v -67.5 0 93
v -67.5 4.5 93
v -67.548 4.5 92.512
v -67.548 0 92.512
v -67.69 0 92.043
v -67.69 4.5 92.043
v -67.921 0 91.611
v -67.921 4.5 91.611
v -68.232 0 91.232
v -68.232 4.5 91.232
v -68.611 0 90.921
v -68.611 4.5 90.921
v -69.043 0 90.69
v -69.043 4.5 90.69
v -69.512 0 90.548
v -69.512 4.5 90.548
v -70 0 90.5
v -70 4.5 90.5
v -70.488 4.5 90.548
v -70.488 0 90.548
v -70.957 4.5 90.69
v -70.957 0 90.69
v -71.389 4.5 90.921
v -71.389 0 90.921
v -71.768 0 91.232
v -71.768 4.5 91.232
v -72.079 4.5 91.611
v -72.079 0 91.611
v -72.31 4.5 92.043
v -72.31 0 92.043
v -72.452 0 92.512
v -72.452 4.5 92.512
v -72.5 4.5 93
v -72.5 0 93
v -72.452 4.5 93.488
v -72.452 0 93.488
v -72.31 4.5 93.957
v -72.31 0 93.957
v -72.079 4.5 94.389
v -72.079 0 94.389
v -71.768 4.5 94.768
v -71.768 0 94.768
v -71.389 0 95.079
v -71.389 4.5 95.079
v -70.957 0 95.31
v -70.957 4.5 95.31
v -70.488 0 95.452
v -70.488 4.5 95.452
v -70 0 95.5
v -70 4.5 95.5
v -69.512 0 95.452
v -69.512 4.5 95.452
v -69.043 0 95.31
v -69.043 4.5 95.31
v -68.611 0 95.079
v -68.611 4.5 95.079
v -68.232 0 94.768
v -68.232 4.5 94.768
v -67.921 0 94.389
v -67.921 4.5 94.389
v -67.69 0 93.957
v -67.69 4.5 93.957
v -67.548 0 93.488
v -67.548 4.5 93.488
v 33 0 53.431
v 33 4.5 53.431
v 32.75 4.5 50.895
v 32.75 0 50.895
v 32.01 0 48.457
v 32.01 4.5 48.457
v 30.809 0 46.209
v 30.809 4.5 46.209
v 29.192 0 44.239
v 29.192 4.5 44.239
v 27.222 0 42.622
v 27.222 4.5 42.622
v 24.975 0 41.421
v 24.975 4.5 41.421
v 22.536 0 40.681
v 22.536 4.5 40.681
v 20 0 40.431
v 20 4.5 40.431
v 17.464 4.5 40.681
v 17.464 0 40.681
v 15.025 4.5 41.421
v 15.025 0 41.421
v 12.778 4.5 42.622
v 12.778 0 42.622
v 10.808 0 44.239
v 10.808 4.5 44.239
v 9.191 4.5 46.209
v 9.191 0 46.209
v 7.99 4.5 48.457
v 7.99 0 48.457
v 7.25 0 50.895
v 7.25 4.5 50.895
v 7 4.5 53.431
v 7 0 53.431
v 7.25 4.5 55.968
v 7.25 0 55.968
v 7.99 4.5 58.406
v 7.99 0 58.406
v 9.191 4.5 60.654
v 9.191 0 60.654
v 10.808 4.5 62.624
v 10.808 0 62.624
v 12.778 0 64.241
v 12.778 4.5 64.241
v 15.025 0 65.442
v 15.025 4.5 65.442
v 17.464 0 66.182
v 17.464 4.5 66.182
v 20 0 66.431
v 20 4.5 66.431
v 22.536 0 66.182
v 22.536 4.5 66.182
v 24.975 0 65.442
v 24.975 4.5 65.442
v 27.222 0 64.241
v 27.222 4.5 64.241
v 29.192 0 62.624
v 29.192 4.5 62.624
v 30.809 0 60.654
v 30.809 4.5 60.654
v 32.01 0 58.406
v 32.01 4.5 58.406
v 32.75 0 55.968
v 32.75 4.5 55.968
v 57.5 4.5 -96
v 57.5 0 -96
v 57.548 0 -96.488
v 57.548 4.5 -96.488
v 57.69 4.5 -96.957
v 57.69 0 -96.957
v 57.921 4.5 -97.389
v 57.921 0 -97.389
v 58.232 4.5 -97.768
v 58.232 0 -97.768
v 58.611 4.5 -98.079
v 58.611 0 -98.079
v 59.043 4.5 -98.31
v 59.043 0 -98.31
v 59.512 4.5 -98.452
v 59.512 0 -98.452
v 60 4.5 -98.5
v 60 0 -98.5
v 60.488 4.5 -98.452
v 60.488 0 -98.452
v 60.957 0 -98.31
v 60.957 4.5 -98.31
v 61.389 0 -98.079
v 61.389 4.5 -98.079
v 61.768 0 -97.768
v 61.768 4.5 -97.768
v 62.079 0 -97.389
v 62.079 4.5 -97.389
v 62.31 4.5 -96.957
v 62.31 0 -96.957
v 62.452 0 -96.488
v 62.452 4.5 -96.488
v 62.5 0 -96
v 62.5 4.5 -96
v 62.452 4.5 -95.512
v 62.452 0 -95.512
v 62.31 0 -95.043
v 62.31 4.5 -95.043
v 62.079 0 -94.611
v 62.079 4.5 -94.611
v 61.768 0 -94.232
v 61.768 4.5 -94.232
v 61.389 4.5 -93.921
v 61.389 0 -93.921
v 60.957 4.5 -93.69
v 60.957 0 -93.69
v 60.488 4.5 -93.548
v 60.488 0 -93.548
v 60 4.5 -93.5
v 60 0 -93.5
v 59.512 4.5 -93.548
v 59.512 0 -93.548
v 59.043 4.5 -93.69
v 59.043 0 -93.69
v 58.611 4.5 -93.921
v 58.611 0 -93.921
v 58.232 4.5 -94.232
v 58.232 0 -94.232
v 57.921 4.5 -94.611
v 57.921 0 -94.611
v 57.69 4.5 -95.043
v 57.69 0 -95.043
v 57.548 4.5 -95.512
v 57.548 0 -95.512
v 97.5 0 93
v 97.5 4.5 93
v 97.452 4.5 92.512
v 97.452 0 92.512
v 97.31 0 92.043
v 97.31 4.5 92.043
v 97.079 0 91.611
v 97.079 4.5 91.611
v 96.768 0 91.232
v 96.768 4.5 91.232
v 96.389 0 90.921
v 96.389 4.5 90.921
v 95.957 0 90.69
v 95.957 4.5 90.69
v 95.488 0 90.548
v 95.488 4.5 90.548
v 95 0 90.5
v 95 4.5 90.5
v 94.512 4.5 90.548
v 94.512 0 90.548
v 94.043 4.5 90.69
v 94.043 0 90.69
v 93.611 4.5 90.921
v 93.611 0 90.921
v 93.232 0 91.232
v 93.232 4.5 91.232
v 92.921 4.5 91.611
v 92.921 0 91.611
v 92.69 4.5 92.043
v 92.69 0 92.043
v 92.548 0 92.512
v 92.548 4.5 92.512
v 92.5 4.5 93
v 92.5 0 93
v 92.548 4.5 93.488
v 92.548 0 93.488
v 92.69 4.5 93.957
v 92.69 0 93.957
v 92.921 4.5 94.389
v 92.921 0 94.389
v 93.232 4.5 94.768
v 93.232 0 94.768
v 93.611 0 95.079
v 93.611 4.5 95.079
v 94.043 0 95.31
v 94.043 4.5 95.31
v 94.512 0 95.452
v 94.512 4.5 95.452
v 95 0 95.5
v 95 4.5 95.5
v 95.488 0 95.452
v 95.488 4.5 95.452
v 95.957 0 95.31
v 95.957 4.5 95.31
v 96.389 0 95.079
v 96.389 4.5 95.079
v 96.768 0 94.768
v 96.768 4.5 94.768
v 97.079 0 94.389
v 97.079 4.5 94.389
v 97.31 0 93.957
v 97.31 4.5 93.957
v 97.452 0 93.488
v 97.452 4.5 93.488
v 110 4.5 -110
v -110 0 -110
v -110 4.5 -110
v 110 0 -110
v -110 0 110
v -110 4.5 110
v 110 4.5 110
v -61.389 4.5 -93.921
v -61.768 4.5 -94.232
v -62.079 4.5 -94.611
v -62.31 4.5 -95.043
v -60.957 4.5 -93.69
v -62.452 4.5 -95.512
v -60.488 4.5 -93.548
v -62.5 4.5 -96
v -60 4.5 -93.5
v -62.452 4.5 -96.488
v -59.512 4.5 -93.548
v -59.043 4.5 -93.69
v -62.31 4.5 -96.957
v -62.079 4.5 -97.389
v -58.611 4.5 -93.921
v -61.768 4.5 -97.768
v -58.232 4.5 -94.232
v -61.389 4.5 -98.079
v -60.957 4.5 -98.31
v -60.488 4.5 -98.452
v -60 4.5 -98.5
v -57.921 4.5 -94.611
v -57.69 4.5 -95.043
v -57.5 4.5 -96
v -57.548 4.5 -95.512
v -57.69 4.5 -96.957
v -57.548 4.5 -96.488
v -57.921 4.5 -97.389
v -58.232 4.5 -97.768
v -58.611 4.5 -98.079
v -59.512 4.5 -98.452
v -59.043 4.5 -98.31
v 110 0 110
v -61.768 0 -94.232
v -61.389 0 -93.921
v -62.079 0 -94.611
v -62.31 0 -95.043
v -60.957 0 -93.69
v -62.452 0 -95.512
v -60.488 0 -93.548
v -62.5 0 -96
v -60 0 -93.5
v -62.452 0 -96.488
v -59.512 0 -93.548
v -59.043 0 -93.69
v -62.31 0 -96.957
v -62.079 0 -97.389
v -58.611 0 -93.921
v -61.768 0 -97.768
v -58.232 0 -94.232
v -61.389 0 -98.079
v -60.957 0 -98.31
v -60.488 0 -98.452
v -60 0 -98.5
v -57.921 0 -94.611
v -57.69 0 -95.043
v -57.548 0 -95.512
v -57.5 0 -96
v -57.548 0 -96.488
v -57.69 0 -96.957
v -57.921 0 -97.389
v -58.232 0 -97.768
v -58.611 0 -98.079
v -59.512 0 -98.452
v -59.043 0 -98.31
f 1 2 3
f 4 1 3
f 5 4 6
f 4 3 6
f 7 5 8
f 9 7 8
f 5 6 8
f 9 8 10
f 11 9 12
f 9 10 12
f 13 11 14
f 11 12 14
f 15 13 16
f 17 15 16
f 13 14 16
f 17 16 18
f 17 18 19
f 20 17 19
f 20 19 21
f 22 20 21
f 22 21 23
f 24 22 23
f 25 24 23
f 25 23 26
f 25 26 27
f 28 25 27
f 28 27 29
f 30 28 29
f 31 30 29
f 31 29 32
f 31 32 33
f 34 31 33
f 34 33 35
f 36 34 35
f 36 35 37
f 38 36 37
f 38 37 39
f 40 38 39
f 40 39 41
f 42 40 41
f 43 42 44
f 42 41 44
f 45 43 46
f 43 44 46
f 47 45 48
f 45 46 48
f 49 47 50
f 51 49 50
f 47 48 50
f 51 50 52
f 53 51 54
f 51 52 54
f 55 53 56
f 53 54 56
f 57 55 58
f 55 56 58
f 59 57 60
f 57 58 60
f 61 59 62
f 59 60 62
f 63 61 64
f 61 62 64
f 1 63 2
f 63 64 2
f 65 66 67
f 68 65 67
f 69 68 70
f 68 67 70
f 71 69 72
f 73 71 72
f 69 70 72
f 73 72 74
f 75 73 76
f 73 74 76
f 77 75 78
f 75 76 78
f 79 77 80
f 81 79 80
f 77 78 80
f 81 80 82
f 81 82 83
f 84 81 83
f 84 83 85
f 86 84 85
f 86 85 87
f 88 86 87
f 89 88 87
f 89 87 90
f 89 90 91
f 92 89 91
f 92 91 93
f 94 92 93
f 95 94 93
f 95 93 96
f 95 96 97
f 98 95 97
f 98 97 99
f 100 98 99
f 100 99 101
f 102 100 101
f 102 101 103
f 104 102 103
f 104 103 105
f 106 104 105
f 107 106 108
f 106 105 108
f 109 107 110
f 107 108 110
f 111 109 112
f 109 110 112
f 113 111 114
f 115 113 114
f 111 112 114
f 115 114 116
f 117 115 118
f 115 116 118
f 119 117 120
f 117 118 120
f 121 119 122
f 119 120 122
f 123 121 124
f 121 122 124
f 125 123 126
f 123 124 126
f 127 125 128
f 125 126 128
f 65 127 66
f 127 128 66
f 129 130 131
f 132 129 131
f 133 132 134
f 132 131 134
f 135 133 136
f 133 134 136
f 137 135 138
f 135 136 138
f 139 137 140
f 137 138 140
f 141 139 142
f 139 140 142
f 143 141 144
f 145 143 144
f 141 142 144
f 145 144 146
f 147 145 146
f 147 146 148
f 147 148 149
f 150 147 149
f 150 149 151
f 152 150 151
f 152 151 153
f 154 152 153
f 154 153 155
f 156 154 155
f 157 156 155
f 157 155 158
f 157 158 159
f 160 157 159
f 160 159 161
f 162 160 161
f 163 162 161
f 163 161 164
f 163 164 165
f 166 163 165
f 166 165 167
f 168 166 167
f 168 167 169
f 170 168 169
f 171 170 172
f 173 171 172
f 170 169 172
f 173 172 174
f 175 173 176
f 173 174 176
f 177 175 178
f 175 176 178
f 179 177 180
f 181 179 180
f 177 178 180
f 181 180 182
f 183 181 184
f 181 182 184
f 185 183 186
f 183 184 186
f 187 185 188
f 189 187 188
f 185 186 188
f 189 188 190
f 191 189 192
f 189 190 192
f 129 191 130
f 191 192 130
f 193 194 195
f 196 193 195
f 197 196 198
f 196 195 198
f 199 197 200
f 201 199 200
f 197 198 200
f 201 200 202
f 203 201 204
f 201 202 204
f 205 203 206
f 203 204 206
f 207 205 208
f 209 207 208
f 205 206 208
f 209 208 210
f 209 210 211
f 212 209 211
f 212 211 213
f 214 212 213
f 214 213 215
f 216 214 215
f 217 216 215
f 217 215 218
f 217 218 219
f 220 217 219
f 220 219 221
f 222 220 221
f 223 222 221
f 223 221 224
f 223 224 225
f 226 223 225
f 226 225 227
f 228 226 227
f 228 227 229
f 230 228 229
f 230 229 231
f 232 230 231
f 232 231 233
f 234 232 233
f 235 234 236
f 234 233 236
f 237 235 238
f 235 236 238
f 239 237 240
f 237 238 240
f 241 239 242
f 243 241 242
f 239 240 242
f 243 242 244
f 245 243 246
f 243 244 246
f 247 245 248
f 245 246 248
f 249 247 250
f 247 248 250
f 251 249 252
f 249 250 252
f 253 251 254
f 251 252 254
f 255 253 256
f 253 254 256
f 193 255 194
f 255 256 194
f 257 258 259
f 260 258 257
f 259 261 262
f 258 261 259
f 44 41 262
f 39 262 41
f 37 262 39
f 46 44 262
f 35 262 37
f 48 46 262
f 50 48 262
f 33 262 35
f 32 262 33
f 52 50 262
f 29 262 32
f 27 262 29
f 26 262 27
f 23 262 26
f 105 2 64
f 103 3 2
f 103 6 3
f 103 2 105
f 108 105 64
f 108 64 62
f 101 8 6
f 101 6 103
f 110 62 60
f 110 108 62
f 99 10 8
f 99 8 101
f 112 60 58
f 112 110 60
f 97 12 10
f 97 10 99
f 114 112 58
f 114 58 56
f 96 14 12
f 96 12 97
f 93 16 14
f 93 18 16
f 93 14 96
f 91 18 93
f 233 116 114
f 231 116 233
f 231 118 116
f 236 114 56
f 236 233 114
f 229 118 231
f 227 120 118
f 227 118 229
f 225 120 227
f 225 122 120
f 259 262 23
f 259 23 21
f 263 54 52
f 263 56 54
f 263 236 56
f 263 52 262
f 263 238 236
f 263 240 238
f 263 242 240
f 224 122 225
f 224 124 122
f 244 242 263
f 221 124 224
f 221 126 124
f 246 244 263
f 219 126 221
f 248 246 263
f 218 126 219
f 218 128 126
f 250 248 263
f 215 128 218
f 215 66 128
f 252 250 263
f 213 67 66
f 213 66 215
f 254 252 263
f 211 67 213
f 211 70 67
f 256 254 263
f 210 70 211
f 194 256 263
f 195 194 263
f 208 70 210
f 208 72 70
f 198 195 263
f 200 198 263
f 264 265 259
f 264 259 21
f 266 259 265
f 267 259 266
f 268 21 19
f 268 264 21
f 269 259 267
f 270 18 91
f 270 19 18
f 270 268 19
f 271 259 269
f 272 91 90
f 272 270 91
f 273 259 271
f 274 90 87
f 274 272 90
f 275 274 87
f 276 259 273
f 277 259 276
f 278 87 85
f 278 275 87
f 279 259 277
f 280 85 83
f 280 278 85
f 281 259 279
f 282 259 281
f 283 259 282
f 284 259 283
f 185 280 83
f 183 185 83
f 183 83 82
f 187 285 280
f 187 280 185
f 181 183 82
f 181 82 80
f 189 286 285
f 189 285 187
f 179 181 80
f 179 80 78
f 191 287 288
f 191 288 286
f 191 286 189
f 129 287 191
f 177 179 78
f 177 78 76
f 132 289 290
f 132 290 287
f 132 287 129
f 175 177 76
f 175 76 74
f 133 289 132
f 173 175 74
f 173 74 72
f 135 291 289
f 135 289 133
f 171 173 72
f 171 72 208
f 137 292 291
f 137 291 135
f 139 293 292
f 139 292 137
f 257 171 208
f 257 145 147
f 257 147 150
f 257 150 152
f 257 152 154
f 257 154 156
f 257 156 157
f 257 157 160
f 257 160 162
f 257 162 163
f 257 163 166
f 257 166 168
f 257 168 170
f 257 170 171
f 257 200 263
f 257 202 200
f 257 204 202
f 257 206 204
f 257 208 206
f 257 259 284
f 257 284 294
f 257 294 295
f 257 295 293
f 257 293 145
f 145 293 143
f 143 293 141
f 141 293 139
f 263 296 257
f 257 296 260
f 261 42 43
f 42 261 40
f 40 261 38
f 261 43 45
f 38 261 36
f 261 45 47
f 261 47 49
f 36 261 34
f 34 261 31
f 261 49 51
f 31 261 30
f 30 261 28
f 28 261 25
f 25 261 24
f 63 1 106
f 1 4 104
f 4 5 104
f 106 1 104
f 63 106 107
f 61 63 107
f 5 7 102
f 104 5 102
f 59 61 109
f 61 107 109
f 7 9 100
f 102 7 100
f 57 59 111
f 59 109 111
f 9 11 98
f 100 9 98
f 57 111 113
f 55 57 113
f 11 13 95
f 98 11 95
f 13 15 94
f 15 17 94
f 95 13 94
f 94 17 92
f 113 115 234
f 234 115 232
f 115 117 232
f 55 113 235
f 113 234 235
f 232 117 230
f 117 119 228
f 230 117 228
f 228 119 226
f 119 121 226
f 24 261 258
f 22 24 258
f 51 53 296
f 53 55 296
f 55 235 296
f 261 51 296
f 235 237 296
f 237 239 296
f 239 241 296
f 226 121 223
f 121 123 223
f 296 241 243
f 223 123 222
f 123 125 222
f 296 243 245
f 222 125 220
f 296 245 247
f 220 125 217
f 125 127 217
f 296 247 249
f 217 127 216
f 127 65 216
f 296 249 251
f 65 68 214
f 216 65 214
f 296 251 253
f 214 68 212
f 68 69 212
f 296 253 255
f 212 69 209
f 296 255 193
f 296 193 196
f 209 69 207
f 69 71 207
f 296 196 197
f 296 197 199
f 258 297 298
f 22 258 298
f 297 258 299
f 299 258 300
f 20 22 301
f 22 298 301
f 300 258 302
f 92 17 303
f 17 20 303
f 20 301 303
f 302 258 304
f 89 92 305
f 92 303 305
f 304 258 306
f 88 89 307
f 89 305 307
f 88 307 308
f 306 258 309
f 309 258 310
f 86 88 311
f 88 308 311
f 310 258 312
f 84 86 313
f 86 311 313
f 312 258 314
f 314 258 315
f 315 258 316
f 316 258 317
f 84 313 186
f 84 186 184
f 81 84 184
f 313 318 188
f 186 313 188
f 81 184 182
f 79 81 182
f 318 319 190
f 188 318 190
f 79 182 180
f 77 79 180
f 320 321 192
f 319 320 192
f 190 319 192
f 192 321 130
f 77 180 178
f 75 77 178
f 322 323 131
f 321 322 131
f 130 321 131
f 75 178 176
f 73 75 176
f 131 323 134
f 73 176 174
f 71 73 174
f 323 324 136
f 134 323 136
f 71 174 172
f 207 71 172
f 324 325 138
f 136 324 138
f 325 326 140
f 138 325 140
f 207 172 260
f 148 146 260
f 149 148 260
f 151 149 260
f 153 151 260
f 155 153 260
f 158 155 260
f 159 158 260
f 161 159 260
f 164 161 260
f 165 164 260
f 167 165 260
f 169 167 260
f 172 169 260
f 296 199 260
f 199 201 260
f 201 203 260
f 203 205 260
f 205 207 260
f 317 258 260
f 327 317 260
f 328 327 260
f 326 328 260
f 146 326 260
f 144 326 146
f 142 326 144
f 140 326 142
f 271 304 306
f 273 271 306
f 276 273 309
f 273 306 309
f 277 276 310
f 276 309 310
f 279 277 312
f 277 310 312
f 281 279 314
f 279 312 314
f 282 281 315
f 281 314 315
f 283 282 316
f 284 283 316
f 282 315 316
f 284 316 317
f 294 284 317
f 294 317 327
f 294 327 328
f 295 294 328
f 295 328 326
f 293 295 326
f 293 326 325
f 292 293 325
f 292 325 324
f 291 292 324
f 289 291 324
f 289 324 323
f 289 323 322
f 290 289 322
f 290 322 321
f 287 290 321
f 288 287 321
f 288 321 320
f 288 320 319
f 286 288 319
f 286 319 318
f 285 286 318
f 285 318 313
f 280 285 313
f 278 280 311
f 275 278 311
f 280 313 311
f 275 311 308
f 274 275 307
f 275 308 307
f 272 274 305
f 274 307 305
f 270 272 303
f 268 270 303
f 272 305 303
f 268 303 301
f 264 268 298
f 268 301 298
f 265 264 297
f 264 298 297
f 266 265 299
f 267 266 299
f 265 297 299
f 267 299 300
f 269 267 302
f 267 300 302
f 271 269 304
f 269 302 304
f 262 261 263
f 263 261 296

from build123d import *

# Parameters (mm, degrees)
SKETCH1_W           = 220
SKETCH1_H           = 220
BOSS_EXTRUDE1_DEPTH = 4.5
CUT_EXTRUDE1_REACH  = 6.5
SKETCH2_R           = 13
CUT_EXTRUDE2_REACH  = 6.5
SKETCH3_R           = 2.5
CUT_EXTRUDE3_REACH  = 6.5
SKETCH4_R           = 2.5


with BuildPart() as part:
    # Sketch1 → Boss-Extrude1 (new body)
    with BuildSketch(Plane(origin=(0, 0, 0), x_dir=(1, 0, 0), z_dir=(0, 1, 0))):
        Rectangle(SKETCH1_W, SKETCH1_H)
    extrude(amount=BOSS_EXTRUDE1_DEPTH)

    # Sketch2 → Cut-Extrude1 (cut, up to next)
    with BuildSketch(Plane(origin=(0, 4.5, 0), x_dir=(1, 0, 0), z_dir=(0, 1, 0)), mode=Mode.PRIVATE) as cut_extrude1_sk1:
        with Locations((20, -53.431457505)):
            Circle(SKETCH2_R)
    cut_extrude1_tool1 = extrude(cut_extrude1_sk1.sketch, amount=-CUT_EXTRUDE1_REACH, mode=Mode.PRIVATE) & part.part
    add(cut_extrude1_tool1.solids().sort_by_distance((20, 4.5, 53.431458))[0], mode=Mode.SUBTRACT)

    # Sketch3 → Cut-Extrude2 (cut, up to next)
    with BuildSketch(Plane(origin=(0, 4.5, 0), x_dir=(1, 0, 0), z_dir=(0, 1, 0)), mode=Mode.PRIVATE) as cut_extrude2_sk1:
        with Locations((95, -93)):
            Circle(SKETCH3_R)
    cut_extrude2_tool1 = extrude(cut_extrude2_sk1.sketch, amount=-CUT_EXTRUDE2_REACH, mode=Mode.PRIVATE) & part.part
    add(cut_extrude2_tool1.solids().sort_by_distance((95, 4.5, 93))[0], mode=Mode.SUBTRACT)
    # Sketch3 → Cut-Extrude2 (cut, up to next)
    with BuildSketch(Plane(origin=(0, 4.5, 0), x_dir=(1, 0, 0), z_dir=(0, 1, 0)), mode=Mode.PRIVATE) as cut_extrude2_sk2:
        with Locations((-70, -93)):
            Circle(SKETCH3_R)
    cut_extrude2_tool2 = extrude(cut_extrude2_sk2.sketch, amount=-CUT_EXTRUDE2_REACH, mode=Mode.PRIVATE) & part.part
    add(cut_extrude2_tool2.solids().sort_by_distance((-70, 4.5, 93))[0], mode=Mode.SUBTRACT)

    # Sketch4 → Cut-Extrude3 (cut, up to next)
    with BuildSketch(Plane(origin=(0, 0, 0), x_dir=(-1, 0, 0), z_dir=(0, -1, 0)), mode=Mode.PRIVATE) as cut_extrude3_sk1:
        with Locations((-60, 96)):
            Circle(SKETCH4_R)
    cut_extrude3_tool1 = extrude(cut_extrude3_sk1.sketch, amount=-CUT_EXTRUDE3_REACH, mode=Mode.PRIVATE) & part.part
    add(cut_extrude3_tool1.solids().sort_by_distance((60, 0, -96))[0], mode=Mode.SUBTRACT)
    # Sketch4 → Cut-Extrude3 (cut, up to next)
    with BuildSketch(Plane(origin=(0, 0, 0), x_dir=(-1, 0, 0), z_dir=(0, -1, 0)), mode=Mode.PRIVATE) as cut_extrude3_sk2:
        with Locations((60, 96)):
            Circle(SKETCH4_R)
    cut_extrude3_tool2 = extrude(cut_extrude3_sk2.sketch, amount=-CUT_EXTRUDE3_REACH, mode=Mode.PRIVATE) & part.part
    add(cut_extrude3_tool2.solids().sort_by_distance((-60, 0, -96))[0], mode=Mode.SUBTRACT)


solid = part.part
